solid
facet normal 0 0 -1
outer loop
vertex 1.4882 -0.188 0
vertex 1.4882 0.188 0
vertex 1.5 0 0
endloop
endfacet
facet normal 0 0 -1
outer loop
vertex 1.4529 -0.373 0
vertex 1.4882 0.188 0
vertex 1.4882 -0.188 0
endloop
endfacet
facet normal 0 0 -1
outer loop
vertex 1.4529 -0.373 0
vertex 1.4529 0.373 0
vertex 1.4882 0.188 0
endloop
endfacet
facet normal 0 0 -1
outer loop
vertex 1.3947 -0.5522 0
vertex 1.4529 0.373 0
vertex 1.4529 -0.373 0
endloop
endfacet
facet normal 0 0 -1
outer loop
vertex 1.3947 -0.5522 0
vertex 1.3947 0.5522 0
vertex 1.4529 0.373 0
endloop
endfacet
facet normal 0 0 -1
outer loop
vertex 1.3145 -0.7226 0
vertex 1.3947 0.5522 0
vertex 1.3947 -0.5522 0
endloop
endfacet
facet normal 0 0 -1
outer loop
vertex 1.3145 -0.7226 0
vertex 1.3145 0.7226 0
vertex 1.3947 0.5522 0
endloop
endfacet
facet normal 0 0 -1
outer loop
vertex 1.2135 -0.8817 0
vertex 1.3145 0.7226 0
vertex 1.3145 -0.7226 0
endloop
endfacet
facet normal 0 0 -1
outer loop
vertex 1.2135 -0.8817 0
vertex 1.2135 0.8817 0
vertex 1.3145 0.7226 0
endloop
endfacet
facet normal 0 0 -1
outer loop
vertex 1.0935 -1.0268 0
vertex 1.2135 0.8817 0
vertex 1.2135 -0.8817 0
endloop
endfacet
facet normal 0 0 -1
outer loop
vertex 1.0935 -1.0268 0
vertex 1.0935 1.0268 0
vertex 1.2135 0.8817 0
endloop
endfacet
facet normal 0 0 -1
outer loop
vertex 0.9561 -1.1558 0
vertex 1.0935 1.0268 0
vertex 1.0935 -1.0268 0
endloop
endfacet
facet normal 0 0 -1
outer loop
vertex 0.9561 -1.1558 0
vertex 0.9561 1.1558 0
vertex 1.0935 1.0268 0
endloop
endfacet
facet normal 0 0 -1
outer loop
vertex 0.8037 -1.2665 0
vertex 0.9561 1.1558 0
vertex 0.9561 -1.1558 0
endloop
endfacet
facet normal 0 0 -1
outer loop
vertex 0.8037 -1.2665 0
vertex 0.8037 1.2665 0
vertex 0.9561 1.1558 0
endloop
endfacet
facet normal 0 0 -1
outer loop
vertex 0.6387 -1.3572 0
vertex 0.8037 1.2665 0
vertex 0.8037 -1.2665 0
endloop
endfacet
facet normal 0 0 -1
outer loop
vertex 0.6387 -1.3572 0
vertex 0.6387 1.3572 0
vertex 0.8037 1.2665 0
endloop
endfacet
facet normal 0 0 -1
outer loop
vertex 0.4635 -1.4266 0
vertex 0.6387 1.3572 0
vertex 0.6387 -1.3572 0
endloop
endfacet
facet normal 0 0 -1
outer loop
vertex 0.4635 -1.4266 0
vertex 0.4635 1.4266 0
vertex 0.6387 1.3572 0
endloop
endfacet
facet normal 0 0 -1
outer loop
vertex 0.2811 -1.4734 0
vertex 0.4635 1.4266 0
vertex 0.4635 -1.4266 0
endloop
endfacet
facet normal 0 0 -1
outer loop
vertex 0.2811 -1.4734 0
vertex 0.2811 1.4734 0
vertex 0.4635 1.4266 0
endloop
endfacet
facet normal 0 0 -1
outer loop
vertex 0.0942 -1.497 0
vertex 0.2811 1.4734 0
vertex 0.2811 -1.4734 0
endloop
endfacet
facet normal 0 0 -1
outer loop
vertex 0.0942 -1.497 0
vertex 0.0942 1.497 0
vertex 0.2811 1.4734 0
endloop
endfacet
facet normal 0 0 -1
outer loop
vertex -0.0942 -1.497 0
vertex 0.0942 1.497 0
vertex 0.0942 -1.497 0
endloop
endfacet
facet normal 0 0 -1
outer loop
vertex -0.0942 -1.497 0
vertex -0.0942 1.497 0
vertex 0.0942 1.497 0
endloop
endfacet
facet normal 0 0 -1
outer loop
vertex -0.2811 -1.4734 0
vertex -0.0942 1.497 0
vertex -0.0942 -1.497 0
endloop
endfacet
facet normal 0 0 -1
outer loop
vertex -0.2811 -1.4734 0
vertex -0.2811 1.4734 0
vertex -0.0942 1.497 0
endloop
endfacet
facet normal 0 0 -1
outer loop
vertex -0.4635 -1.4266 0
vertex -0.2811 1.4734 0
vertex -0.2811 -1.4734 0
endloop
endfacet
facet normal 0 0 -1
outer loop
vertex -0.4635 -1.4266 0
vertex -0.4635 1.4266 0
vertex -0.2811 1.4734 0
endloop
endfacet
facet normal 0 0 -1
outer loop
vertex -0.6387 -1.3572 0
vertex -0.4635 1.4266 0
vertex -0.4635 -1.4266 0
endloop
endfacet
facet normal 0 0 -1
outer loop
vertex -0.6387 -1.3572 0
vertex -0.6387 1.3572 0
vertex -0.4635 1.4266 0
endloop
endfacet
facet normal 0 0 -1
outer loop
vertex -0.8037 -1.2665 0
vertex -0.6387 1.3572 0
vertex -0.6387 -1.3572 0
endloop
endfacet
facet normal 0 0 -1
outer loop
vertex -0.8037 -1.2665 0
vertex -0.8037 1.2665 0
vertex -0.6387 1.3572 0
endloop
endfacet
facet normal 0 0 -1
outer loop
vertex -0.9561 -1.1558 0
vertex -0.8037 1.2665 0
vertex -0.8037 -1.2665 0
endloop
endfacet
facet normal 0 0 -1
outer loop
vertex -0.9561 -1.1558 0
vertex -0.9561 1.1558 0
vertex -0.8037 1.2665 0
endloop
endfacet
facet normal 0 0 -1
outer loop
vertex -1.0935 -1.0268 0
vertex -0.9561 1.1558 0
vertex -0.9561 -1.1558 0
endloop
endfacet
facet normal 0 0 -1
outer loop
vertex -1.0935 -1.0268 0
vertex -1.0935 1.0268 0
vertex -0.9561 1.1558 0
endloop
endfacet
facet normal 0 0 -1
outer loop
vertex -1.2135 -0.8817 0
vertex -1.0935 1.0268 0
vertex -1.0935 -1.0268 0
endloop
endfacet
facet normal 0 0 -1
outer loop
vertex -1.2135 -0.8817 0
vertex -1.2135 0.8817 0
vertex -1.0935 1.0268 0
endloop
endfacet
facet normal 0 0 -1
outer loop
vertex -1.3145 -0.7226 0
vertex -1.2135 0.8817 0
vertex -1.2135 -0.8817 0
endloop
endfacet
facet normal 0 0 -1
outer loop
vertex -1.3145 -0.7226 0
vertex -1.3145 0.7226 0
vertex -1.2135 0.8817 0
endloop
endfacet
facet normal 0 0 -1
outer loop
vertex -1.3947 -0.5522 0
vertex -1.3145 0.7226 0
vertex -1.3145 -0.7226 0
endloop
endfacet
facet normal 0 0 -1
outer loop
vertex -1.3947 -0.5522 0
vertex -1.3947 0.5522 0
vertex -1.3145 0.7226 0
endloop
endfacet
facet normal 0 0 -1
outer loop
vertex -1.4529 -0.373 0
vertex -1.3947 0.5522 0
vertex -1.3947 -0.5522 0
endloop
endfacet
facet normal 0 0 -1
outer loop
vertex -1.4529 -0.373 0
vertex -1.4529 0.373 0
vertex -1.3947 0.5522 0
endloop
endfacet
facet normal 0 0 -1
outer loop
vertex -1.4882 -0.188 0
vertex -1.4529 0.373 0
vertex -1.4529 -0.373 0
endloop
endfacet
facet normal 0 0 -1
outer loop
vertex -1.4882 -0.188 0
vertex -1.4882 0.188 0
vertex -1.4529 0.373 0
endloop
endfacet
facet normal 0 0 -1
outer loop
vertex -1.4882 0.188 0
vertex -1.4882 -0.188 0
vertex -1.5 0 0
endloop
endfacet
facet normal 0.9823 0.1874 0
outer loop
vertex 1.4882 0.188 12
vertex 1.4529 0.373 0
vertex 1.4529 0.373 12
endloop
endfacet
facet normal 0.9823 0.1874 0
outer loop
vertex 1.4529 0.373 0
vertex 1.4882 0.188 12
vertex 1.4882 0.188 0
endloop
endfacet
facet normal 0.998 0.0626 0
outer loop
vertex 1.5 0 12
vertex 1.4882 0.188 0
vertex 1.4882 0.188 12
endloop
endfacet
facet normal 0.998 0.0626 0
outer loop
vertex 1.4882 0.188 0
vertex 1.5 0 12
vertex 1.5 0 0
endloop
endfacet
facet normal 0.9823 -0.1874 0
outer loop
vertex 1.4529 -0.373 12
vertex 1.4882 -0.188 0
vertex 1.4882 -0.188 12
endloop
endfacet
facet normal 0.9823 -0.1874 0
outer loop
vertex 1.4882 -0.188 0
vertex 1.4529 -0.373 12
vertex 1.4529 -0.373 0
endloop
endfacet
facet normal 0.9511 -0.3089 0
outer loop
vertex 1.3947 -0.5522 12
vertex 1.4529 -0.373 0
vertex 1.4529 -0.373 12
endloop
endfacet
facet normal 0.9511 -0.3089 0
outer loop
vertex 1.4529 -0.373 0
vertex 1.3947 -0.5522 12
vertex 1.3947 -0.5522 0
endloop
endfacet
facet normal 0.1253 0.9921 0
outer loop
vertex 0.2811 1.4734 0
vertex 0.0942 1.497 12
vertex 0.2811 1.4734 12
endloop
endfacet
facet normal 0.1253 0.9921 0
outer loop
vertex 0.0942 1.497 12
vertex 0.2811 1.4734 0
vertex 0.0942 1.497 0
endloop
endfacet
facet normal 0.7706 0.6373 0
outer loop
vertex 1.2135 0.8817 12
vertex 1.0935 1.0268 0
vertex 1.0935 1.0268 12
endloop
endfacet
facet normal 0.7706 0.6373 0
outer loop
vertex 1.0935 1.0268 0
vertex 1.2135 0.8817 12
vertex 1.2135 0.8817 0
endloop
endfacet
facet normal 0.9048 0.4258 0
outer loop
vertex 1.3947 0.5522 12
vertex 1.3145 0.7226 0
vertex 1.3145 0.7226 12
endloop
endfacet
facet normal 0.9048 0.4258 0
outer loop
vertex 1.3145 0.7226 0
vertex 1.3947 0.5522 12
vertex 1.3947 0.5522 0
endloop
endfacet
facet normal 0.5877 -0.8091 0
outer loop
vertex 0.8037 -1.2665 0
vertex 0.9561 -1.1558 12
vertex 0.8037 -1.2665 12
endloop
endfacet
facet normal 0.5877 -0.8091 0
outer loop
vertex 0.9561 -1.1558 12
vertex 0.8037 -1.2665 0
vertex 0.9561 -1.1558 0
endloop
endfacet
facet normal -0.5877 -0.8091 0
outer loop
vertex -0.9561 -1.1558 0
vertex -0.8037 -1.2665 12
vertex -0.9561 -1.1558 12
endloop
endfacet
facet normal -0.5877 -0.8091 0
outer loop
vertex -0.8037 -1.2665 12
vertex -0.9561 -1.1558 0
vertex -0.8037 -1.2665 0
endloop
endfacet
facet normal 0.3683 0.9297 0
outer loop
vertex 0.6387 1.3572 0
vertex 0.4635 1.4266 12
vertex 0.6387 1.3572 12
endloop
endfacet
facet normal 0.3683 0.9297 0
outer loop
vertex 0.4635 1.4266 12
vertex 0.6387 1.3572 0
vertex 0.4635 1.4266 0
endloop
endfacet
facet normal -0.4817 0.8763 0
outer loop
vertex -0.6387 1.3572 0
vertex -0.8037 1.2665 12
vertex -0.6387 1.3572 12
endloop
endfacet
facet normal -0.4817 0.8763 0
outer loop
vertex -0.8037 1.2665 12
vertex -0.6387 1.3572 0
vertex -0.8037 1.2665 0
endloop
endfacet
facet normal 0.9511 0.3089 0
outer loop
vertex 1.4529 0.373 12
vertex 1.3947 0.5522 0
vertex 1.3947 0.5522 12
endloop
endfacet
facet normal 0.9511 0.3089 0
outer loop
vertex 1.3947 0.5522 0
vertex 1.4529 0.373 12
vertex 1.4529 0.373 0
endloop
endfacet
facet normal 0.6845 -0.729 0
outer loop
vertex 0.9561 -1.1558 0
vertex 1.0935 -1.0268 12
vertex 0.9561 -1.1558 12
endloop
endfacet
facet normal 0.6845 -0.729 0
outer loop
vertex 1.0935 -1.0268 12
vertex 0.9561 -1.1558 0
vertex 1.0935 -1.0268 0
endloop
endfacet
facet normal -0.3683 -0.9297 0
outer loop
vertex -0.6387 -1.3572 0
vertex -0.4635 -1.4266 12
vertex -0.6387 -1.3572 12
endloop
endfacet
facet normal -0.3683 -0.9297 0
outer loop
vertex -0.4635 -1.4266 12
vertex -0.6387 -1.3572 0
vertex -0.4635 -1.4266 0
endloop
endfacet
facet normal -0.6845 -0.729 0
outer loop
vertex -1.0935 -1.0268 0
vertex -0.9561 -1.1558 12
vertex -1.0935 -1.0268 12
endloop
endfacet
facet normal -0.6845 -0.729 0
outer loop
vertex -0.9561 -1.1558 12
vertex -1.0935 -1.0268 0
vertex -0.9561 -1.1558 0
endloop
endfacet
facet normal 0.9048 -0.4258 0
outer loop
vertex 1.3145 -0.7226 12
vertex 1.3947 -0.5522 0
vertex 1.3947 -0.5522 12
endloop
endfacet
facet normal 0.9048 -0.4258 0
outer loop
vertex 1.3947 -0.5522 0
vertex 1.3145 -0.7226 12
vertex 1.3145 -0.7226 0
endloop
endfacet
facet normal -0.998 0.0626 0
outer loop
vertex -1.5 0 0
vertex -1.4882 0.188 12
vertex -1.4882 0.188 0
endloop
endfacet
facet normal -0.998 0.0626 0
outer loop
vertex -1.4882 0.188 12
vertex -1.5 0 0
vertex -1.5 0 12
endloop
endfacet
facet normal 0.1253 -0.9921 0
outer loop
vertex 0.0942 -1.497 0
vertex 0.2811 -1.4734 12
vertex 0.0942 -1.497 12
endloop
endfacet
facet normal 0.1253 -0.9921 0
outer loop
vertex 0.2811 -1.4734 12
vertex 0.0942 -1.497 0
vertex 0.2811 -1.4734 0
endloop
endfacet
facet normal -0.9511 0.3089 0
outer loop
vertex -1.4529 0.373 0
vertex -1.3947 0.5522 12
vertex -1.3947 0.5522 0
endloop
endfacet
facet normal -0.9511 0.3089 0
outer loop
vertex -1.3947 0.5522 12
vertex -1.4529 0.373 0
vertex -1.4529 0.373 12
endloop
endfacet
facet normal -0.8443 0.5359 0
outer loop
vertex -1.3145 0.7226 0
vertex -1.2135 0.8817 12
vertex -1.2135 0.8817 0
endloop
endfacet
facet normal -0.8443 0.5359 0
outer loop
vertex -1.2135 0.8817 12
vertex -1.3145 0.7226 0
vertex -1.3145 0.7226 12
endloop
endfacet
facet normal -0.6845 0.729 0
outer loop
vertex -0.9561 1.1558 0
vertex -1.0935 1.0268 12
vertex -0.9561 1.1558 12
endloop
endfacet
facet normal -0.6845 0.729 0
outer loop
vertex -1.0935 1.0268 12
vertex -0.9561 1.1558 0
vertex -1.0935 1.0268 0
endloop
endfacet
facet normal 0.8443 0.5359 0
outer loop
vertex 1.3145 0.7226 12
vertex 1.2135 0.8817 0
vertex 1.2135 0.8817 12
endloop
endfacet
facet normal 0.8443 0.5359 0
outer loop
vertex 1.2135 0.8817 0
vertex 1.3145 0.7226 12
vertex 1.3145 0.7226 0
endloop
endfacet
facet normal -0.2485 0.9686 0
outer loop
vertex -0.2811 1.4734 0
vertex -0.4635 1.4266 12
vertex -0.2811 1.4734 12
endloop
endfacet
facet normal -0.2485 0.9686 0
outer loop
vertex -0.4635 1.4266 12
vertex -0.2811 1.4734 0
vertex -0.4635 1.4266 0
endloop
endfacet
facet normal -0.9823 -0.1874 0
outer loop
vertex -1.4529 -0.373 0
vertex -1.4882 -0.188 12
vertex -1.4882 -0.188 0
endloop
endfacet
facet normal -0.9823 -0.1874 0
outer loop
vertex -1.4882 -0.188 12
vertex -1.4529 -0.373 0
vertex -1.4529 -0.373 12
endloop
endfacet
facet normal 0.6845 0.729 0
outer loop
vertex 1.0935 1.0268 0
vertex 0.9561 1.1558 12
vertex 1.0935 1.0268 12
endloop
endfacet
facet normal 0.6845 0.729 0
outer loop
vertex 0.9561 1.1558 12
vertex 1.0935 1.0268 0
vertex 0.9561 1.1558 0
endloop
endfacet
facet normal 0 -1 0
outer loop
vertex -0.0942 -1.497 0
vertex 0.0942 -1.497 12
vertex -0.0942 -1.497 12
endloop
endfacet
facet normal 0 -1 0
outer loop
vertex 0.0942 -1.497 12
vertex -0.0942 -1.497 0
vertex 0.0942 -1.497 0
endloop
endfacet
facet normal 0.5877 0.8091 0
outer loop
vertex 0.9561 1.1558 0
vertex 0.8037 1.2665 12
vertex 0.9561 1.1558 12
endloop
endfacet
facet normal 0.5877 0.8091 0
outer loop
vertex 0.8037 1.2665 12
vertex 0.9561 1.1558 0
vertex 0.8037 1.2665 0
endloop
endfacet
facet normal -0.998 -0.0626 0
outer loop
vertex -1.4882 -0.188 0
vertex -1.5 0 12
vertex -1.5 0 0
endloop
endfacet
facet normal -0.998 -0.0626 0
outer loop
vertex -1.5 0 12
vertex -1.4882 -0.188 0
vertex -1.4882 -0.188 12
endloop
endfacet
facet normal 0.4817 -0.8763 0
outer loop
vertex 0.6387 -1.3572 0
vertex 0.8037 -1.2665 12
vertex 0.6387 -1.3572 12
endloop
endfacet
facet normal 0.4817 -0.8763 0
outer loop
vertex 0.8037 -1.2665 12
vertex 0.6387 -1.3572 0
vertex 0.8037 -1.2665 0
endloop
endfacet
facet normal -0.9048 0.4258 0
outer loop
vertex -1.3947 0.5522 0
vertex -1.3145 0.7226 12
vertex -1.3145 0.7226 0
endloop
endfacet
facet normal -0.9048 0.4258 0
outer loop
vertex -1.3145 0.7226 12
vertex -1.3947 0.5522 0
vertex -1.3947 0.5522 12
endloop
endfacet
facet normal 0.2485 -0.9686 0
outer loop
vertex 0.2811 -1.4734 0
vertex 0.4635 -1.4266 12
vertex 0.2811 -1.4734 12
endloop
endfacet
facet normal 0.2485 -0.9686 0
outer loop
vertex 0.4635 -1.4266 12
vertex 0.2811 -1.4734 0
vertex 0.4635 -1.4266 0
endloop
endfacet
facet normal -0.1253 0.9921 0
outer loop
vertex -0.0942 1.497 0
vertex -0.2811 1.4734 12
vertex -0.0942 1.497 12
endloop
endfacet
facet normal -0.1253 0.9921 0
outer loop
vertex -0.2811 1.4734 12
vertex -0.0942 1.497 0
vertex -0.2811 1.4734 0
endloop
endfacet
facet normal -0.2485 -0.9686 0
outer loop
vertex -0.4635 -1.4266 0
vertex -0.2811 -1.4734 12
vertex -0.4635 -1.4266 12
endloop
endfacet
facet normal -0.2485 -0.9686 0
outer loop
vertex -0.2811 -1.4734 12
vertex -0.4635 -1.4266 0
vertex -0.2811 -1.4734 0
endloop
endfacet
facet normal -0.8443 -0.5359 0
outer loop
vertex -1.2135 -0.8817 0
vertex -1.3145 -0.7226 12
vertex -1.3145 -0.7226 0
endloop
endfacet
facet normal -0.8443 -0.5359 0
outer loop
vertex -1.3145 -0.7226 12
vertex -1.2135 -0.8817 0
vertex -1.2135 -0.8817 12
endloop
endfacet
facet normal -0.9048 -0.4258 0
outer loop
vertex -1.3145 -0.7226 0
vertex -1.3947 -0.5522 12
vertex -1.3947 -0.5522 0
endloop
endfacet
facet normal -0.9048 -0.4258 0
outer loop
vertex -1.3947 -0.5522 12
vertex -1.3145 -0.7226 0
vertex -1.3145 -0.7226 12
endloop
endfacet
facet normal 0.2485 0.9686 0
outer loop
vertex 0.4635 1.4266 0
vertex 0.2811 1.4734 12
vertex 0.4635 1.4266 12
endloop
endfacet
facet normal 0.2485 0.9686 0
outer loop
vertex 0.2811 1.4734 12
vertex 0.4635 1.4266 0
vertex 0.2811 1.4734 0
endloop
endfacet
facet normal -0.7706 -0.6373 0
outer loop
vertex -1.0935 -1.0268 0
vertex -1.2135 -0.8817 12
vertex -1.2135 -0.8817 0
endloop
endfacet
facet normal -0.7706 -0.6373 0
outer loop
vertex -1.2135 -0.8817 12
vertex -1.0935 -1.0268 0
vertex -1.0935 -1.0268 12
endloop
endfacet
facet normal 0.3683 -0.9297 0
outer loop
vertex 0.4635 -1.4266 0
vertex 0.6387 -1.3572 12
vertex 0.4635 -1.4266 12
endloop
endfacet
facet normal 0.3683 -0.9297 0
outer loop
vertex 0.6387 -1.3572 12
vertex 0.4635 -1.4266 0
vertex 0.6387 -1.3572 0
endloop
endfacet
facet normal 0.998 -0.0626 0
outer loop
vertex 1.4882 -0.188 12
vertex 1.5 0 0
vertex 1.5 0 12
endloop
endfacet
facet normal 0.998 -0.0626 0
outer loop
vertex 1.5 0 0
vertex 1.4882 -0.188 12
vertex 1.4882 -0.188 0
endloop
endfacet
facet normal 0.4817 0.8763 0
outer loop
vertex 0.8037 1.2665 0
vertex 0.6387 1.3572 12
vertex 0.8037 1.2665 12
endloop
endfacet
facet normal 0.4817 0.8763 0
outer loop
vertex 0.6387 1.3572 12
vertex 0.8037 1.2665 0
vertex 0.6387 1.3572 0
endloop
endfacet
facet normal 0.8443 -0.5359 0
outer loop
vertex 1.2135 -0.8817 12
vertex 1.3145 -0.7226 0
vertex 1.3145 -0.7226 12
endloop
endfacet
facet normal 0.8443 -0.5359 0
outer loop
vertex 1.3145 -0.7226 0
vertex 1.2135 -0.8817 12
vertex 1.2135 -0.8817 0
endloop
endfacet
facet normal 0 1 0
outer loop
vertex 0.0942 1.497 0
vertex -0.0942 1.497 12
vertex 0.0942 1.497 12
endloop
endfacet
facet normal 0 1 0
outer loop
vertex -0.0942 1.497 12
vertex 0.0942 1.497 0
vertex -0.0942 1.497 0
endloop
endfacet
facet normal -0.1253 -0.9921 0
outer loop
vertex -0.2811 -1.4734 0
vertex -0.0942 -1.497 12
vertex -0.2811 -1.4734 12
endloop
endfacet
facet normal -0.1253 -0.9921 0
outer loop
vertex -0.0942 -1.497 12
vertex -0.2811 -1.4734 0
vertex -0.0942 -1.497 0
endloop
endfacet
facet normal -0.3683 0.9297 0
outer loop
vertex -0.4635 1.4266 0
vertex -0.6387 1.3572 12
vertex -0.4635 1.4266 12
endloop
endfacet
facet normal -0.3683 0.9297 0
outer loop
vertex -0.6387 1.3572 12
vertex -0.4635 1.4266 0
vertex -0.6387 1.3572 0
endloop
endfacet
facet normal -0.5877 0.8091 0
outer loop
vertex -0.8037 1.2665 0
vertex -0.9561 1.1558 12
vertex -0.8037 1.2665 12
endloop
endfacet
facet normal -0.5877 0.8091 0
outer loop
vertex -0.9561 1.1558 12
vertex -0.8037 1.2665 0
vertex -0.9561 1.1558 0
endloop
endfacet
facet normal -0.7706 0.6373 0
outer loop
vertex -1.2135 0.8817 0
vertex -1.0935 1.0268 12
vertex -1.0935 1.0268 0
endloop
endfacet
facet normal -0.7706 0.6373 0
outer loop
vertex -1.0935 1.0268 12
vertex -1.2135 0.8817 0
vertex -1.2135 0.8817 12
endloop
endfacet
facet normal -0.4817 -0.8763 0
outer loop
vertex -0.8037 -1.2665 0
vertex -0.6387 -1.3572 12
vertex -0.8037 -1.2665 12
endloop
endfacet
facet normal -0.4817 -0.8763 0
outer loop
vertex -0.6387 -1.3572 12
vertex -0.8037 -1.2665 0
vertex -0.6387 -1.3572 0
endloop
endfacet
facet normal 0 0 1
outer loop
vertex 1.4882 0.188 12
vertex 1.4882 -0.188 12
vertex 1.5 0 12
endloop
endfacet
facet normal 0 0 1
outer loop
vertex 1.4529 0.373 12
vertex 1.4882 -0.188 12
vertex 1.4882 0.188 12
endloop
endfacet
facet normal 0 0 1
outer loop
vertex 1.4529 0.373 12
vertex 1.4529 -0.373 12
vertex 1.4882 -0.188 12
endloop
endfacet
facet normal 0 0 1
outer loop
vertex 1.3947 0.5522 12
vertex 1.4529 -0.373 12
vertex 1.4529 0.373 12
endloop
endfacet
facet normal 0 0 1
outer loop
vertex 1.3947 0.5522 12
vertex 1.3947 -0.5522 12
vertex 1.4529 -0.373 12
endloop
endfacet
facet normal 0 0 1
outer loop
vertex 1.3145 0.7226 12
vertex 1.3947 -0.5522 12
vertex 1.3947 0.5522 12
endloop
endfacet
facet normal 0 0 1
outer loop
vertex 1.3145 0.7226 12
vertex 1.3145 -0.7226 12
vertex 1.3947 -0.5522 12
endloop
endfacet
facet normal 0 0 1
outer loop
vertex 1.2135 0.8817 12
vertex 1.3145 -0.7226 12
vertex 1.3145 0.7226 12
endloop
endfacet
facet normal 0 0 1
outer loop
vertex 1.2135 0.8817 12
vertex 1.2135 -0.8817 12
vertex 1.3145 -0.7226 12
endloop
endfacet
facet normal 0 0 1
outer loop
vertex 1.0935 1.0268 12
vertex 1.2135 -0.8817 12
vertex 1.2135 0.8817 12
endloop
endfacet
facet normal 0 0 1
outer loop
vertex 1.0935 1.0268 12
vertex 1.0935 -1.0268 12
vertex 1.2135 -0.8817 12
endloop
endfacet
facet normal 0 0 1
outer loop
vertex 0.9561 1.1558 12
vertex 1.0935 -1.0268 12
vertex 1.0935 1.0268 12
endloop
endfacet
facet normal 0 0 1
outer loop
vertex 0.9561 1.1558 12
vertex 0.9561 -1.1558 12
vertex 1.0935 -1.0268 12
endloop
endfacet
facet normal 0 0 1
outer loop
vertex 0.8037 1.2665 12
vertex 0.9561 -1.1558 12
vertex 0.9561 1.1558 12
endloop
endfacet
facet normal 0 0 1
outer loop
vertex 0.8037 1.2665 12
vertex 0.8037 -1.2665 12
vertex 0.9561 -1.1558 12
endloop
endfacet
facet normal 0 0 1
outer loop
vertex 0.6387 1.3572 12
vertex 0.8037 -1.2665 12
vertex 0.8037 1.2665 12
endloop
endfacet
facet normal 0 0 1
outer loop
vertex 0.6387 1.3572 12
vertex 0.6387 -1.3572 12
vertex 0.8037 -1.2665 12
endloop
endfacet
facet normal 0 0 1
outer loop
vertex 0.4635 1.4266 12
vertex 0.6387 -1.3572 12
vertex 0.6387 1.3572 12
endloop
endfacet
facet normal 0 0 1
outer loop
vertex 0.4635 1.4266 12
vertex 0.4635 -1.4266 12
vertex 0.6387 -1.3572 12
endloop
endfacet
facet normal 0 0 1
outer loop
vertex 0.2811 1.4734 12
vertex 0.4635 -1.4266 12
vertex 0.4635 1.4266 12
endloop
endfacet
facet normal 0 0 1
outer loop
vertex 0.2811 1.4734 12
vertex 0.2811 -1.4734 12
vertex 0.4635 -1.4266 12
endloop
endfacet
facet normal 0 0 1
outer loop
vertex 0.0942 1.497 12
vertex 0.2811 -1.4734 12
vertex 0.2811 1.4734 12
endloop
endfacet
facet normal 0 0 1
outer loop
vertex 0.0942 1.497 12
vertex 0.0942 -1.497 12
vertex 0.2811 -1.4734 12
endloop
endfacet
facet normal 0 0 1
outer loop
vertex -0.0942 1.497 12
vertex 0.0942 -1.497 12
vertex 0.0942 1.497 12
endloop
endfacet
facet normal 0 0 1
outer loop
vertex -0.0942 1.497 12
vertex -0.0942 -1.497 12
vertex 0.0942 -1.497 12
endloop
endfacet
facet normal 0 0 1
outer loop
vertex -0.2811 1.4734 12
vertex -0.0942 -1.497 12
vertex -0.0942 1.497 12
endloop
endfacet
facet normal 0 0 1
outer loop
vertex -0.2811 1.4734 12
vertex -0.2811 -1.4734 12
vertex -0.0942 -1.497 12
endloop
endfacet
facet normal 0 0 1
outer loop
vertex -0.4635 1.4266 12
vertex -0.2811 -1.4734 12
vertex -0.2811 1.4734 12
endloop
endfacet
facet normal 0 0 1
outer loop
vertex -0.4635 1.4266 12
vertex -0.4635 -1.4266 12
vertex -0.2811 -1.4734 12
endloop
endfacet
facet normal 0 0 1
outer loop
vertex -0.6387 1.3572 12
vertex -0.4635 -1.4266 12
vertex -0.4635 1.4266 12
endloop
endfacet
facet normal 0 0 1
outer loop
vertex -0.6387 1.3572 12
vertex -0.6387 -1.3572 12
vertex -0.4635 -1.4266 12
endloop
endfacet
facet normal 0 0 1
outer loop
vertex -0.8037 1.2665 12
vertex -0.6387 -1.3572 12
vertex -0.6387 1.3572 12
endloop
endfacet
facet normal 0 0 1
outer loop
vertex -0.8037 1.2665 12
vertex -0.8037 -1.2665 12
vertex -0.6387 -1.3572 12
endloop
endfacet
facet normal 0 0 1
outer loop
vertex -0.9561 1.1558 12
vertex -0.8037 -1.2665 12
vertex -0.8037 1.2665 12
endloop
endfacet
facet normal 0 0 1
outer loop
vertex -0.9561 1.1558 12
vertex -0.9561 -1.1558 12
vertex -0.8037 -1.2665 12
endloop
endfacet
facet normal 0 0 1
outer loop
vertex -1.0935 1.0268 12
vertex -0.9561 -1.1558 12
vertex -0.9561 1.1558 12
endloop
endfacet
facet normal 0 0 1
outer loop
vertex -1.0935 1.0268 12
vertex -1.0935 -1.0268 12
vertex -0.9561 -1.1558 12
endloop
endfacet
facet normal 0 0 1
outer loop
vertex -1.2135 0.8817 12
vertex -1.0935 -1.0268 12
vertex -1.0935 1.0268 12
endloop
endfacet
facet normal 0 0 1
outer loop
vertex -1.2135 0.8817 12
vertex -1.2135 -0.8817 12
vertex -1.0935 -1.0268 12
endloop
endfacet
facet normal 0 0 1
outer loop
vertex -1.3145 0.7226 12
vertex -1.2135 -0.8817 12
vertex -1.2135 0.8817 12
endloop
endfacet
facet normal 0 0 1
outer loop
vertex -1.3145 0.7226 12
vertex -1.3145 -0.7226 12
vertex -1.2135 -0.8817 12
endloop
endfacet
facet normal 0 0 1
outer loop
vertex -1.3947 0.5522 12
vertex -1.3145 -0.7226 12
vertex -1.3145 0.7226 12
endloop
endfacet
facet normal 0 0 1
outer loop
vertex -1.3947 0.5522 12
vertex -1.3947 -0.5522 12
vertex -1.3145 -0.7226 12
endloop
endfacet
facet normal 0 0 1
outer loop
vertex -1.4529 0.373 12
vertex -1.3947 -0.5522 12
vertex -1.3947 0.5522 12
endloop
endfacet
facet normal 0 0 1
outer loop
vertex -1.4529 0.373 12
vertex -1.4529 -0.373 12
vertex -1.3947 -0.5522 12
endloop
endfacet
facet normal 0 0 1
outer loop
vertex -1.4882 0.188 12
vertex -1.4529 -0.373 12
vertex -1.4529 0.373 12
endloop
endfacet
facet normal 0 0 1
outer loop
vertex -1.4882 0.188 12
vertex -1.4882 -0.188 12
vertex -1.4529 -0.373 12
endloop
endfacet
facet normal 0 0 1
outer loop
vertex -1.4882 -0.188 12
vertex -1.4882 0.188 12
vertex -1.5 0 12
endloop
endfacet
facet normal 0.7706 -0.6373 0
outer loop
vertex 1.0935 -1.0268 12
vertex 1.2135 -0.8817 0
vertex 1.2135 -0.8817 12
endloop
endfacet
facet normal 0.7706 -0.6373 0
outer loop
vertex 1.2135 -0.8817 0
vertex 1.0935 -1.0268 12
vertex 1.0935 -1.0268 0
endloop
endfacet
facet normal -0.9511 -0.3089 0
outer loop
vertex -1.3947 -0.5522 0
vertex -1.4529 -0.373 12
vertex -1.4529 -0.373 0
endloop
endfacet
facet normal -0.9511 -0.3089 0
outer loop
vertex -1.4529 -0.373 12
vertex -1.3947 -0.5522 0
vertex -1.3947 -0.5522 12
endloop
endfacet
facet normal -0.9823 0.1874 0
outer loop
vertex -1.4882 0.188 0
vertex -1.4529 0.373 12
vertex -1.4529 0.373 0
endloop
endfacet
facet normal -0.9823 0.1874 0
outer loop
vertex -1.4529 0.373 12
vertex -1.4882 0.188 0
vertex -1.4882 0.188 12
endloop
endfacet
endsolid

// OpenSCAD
$fn = 50;

difference() {
	union() {
		cylinder(h = 12, r = 1.5);
	}
	union();
}
